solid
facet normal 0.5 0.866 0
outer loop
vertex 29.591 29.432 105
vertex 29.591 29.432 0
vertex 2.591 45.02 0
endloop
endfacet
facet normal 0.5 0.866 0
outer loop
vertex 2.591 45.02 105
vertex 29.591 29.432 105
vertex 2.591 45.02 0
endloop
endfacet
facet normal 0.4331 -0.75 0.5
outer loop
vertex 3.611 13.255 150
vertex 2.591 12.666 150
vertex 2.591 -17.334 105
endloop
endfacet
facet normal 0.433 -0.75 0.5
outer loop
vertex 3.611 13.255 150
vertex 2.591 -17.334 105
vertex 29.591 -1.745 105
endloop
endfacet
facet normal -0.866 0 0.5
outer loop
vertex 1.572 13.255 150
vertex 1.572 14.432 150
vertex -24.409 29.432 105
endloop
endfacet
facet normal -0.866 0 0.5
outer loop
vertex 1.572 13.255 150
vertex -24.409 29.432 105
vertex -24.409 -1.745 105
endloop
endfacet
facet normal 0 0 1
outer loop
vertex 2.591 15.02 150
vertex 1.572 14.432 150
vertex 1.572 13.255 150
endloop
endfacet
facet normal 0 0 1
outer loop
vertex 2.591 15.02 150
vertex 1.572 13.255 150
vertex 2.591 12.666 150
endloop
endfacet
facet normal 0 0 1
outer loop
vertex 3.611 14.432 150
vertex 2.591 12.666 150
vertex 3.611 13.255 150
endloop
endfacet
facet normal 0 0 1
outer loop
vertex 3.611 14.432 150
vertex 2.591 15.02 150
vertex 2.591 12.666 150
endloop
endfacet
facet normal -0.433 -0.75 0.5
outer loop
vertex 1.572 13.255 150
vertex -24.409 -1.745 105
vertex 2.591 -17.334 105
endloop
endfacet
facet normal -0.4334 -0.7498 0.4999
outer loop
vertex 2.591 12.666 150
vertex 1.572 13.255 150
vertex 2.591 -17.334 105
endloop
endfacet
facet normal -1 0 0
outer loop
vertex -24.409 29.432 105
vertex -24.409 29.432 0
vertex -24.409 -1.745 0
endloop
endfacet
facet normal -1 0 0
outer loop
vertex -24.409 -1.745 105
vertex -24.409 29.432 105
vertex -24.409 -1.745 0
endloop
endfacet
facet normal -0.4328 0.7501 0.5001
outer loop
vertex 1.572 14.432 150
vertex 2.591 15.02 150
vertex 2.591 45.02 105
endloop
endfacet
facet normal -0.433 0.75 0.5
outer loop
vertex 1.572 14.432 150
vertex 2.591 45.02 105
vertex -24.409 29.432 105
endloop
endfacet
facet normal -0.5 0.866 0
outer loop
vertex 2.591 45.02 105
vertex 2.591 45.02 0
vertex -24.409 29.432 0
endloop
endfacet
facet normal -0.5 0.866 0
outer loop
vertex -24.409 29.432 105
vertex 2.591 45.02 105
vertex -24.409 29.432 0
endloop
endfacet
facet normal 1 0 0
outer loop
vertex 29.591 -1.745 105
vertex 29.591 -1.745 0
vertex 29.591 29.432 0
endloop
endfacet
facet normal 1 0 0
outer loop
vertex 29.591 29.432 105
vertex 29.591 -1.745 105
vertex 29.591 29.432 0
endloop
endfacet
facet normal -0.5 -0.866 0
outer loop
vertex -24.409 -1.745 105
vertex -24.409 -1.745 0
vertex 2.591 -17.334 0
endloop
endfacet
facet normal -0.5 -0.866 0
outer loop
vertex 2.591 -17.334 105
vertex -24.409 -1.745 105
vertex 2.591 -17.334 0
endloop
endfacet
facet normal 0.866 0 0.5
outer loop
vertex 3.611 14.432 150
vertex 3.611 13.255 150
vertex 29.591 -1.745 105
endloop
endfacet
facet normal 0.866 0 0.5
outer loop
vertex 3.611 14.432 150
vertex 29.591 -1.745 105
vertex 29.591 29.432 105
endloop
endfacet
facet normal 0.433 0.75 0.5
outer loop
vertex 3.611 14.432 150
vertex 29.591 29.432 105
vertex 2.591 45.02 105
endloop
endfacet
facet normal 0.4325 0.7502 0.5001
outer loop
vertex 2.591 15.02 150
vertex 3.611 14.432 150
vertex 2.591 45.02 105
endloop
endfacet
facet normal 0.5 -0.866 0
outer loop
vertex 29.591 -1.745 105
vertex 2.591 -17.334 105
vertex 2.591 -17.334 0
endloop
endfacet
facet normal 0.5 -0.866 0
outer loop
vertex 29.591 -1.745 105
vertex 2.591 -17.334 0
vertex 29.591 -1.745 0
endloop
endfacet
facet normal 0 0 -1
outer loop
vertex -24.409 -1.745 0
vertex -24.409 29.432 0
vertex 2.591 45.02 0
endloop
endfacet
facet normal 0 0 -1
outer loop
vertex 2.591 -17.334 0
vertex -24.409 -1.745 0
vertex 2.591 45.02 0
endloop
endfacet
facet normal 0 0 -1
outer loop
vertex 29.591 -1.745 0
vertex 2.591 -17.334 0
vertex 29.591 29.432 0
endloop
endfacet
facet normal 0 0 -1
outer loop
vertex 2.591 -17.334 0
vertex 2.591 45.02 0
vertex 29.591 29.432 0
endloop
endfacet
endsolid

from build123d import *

# Parameters (mm, degrees)
F1_DEPTH = 150
F2_SIZE2 = 25.9807621135
F2_SIZE  = 45


with BuildPart() as f1:
    # F0 (on Top) → F1 (new body)
    with BuildSketch(Plane.XY):
        Polygon((-15.4086170788, 13.843306002), (-24.4086170788, 29.4317632701), (-24.4086170788, -1.7451512661), align=None)
        Polygon((2.5913829212, 45.0202205382), (-24.4086170788, 29.4317632701), (-6.4086170788, 29.4317632701), align=None)
        Polygon((-6.4086170788, 29.4317632701), (-24.4086170788, 29.4317632701), (-15.4086170788, 13.843306002), align=None)
        Polygon((29.5913829212, 29.4317632701), (2.5913829212, 45.0202205382), (11.5913829212, 29.4317632701), align=None)
        Polygon((11.5913829212, 29.4317632701), (2.5913829212, 45.0202205382), (-6.4086170788, 29.4317632701), align=None)
        Polygon((-6.4086170788, -1.7451512661), (-24.4086170788, -1.7451512661), (2.5913829212, -17.3336085342), align=None)
        Polygon((-15.4086170788, 13.843306002), (-24.4086170788, -1.7451512661), (-6.4086170788, -1.7451512661), align=None)
        Polygon((20.5913829212, 13.843306002), (29.5913829212, 29.4317632701), (11.5913829212, 29.4317632701), align=None)
        Polygon((29.5913829212, -1.7451512661), (29.5913829212, 29.4317632701), (20.5913829212, 13.843306002), align=None)
        Polygon((11.5913829212, -1.7451512661), (2.5913829212, -17.3336085342), (29.5913829212, -1.7451512661), align=None)
        Polygon((-6.4086170788, -1.7451512661), (2.5913829212, -17.3336085342), (11.5913829212, -1.7451512661), align=None)
        Polygon((11.5913829212, -1.7451512661), (29.5913829212, -1.7451512661), (20.5913829212, 13.843306002), align=None)
        Polygon((11.5913829212, 29.4317632701), (-6.4086170788, 29.4317632701), (-15.4086170788, 13.843306002), (-6.4086170788, -1.7451512661), (11.5913829212, -1.7451512661), (20.5913829212, 13.843306002), align=None)
    extrude(amount=F1_DEPTH)

    # F2
    f2_edges = [f1.edges().sort_by_distance(p)[0] for p in [
        (16.091383, -9.53938, 150),
        (29.591383, 13.843306, 150),
        (16.091383, 37.225992, 150),
        (-10.908617, 37.225992, 150),
        (-24.408617, 13.843306, 150),
        (-10.908617, -9.53938, 150),
    ]]
    chamfer(f2_edges, length=F2_SIZE, length2=F2_SIZE2)


solid = f1.part
